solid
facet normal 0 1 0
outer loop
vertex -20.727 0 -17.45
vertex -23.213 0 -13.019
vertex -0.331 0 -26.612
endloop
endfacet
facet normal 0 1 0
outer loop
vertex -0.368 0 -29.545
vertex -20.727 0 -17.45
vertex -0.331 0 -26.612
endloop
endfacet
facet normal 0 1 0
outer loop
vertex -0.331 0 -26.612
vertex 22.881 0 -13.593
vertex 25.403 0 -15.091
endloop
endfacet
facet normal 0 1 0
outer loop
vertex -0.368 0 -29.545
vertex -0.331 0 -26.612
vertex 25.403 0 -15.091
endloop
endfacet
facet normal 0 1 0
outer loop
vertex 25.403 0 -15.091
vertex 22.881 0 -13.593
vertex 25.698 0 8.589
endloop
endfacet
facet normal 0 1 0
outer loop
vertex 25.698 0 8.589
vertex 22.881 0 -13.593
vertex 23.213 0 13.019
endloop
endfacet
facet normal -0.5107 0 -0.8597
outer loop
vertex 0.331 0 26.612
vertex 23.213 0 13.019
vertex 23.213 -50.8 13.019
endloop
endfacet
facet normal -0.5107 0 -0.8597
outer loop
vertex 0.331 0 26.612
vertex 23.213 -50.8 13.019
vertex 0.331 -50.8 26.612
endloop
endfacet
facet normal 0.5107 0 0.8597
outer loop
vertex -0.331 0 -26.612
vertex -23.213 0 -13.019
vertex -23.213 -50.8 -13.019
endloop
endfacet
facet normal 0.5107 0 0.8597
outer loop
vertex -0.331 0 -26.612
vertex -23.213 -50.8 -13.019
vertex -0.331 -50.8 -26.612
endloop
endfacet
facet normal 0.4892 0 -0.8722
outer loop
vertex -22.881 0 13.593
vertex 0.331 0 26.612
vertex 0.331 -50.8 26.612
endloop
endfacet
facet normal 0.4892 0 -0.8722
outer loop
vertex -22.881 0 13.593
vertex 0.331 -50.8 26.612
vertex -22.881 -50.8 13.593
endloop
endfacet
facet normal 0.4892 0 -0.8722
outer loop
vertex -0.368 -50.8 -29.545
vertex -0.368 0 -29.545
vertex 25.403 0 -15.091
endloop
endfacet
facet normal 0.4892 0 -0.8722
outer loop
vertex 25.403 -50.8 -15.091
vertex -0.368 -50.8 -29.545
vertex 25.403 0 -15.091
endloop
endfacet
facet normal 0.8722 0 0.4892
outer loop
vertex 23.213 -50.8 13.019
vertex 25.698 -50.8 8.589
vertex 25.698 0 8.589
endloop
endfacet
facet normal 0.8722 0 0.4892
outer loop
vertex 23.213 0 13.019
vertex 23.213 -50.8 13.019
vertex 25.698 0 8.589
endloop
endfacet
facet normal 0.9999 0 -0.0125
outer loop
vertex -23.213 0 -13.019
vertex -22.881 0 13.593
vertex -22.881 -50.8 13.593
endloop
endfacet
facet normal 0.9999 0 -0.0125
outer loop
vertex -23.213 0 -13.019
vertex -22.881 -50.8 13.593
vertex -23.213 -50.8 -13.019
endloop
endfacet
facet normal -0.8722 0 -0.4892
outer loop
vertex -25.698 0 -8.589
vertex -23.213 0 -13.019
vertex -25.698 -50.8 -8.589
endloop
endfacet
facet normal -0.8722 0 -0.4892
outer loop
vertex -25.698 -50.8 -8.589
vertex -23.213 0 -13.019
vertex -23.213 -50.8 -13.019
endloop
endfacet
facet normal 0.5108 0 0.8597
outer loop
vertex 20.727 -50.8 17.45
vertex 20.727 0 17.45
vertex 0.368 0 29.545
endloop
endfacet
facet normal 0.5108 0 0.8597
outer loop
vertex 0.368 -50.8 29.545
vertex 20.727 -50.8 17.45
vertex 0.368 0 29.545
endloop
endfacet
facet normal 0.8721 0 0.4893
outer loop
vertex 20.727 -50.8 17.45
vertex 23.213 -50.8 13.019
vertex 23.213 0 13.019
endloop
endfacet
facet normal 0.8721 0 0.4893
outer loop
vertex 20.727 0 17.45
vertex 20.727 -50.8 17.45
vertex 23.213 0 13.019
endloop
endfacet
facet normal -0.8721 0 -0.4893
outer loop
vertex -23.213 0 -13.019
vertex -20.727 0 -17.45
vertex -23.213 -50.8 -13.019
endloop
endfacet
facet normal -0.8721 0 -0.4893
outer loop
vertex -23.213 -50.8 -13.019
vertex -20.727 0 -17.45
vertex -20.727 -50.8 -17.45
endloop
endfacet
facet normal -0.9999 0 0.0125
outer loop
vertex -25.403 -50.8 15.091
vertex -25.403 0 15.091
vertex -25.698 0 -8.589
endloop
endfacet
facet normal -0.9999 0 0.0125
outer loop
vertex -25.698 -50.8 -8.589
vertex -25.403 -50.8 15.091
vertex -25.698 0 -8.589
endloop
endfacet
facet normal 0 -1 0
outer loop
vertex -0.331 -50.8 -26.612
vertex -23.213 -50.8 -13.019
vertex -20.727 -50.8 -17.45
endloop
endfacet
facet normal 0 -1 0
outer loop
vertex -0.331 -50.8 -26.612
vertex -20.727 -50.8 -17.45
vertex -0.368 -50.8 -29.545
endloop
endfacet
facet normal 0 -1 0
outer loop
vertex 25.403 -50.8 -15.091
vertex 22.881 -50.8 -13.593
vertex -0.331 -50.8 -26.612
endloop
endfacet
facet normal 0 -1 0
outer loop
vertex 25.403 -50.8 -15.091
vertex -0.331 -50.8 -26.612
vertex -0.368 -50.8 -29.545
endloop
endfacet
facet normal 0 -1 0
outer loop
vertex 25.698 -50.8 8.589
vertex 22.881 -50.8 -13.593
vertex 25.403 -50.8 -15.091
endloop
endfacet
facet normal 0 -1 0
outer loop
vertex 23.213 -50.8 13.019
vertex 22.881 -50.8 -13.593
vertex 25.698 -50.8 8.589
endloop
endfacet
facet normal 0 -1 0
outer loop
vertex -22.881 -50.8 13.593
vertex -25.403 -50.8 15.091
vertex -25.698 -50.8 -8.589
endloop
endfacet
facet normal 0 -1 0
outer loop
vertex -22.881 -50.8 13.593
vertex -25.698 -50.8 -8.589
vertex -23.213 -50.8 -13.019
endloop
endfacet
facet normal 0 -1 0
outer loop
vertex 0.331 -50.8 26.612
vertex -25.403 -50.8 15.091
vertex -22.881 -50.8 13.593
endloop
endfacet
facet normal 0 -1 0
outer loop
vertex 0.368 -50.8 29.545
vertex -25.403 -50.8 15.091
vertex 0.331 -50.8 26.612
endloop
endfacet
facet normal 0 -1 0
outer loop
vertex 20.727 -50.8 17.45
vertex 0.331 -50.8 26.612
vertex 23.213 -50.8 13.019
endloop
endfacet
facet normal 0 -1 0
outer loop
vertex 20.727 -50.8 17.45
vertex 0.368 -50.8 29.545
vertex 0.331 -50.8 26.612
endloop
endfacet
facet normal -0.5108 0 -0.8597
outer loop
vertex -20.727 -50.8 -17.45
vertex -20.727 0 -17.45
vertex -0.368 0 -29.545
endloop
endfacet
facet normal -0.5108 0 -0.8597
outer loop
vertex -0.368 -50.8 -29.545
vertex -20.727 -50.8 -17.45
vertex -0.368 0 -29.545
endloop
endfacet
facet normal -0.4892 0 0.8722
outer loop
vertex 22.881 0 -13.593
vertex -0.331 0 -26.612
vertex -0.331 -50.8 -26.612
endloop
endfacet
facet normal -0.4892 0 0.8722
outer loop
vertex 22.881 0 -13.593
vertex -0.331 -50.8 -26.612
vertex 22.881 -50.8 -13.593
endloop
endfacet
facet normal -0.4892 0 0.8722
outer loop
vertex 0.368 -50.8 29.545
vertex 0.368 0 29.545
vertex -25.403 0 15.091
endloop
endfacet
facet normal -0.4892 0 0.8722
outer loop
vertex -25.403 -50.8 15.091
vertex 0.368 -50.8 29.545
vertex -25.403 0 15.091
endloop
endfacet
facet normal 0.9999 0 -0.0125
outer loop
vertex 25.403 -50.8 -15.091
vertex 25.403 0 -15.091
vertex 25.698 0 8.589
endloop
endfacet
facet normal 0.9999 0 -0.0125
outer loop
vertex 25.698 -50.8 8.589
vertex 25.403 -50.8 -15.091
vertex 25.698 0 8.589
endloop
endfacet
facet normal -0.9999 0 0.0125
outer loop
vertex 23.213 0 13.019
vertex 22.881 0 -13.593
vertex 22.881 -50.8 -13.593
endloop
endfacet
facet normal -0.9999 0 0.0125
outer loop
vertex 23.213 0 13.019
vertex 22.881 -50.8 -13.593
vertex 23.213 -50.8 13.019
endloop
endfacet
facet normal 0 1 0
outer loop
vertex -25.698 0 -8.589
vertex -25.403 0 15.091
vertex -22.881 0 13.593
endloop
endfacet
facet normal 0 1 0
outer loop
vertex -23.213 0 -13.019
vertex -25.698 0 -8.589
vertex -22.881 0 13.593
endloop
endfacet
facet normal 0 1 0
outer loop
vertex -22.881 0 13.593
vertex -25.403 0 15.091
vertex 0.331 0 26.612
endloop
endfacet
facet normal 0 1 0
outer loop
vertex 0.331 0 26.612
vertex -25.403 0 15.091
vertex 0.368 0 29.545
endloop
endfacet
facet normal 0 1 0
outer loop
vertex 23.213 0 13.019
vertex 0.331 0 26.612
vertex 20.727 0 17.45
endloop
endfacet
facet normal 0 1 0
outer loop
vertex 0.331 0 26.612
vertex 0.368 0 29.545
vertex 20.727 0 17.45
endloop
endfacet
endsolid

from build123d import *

# Parameters (mm, degrees)
F1_DEPTH = 50.8
F2_T     = -2.54
F3_DEPTH = 6.35


with BuildPart() as f1:
    # F0 (on Front) → F1 (new body)
    with BuildSketch(Plane.XZ):
        Polygon((25.7705814952, 14.4541892727), (0.3675956464, 29.5450728815), (-25.4029858488, 15.0908836088), (-25.7705814952, -14.4541892727), (-0.3675956464, -29.5450728815), (25.4029858488, -15.0908836088), align=None)
    extrude(amount=F1_DEPTH)

    # F2
    f2_openings = [f1.faces().sort_by_distance(p)[0] for p in [
        (0, 0, 0),
        (0, -50.8, 0),
    ]]
    offset(amount=F2_T, openings=f2_openings)

    # F3 (intersect, symmetric): faces of the model
    f3_faces = [f1.faces().sort_by_distance(p)[0] for p in [
        (11.2751596844, -25.4, -20.102644018),
        (-11.7718205606, -25.4, -19.8158967274),
        (23.046980245, -25.4, -0.2867472906),
        (11.7718205606, -25.4, 19.8158967274),
        (-23.046980245, -25.4, 0.2867472906),
        (-11.2751596844, -25.4, 20.102644018),
    ]]
    extrude(f3_faces, amount=F3_DEPTH, both=True, dir=(-0.489187172, 0, 0.8721788296), mode=Mode.INTERSECT)


solid = f1.part
